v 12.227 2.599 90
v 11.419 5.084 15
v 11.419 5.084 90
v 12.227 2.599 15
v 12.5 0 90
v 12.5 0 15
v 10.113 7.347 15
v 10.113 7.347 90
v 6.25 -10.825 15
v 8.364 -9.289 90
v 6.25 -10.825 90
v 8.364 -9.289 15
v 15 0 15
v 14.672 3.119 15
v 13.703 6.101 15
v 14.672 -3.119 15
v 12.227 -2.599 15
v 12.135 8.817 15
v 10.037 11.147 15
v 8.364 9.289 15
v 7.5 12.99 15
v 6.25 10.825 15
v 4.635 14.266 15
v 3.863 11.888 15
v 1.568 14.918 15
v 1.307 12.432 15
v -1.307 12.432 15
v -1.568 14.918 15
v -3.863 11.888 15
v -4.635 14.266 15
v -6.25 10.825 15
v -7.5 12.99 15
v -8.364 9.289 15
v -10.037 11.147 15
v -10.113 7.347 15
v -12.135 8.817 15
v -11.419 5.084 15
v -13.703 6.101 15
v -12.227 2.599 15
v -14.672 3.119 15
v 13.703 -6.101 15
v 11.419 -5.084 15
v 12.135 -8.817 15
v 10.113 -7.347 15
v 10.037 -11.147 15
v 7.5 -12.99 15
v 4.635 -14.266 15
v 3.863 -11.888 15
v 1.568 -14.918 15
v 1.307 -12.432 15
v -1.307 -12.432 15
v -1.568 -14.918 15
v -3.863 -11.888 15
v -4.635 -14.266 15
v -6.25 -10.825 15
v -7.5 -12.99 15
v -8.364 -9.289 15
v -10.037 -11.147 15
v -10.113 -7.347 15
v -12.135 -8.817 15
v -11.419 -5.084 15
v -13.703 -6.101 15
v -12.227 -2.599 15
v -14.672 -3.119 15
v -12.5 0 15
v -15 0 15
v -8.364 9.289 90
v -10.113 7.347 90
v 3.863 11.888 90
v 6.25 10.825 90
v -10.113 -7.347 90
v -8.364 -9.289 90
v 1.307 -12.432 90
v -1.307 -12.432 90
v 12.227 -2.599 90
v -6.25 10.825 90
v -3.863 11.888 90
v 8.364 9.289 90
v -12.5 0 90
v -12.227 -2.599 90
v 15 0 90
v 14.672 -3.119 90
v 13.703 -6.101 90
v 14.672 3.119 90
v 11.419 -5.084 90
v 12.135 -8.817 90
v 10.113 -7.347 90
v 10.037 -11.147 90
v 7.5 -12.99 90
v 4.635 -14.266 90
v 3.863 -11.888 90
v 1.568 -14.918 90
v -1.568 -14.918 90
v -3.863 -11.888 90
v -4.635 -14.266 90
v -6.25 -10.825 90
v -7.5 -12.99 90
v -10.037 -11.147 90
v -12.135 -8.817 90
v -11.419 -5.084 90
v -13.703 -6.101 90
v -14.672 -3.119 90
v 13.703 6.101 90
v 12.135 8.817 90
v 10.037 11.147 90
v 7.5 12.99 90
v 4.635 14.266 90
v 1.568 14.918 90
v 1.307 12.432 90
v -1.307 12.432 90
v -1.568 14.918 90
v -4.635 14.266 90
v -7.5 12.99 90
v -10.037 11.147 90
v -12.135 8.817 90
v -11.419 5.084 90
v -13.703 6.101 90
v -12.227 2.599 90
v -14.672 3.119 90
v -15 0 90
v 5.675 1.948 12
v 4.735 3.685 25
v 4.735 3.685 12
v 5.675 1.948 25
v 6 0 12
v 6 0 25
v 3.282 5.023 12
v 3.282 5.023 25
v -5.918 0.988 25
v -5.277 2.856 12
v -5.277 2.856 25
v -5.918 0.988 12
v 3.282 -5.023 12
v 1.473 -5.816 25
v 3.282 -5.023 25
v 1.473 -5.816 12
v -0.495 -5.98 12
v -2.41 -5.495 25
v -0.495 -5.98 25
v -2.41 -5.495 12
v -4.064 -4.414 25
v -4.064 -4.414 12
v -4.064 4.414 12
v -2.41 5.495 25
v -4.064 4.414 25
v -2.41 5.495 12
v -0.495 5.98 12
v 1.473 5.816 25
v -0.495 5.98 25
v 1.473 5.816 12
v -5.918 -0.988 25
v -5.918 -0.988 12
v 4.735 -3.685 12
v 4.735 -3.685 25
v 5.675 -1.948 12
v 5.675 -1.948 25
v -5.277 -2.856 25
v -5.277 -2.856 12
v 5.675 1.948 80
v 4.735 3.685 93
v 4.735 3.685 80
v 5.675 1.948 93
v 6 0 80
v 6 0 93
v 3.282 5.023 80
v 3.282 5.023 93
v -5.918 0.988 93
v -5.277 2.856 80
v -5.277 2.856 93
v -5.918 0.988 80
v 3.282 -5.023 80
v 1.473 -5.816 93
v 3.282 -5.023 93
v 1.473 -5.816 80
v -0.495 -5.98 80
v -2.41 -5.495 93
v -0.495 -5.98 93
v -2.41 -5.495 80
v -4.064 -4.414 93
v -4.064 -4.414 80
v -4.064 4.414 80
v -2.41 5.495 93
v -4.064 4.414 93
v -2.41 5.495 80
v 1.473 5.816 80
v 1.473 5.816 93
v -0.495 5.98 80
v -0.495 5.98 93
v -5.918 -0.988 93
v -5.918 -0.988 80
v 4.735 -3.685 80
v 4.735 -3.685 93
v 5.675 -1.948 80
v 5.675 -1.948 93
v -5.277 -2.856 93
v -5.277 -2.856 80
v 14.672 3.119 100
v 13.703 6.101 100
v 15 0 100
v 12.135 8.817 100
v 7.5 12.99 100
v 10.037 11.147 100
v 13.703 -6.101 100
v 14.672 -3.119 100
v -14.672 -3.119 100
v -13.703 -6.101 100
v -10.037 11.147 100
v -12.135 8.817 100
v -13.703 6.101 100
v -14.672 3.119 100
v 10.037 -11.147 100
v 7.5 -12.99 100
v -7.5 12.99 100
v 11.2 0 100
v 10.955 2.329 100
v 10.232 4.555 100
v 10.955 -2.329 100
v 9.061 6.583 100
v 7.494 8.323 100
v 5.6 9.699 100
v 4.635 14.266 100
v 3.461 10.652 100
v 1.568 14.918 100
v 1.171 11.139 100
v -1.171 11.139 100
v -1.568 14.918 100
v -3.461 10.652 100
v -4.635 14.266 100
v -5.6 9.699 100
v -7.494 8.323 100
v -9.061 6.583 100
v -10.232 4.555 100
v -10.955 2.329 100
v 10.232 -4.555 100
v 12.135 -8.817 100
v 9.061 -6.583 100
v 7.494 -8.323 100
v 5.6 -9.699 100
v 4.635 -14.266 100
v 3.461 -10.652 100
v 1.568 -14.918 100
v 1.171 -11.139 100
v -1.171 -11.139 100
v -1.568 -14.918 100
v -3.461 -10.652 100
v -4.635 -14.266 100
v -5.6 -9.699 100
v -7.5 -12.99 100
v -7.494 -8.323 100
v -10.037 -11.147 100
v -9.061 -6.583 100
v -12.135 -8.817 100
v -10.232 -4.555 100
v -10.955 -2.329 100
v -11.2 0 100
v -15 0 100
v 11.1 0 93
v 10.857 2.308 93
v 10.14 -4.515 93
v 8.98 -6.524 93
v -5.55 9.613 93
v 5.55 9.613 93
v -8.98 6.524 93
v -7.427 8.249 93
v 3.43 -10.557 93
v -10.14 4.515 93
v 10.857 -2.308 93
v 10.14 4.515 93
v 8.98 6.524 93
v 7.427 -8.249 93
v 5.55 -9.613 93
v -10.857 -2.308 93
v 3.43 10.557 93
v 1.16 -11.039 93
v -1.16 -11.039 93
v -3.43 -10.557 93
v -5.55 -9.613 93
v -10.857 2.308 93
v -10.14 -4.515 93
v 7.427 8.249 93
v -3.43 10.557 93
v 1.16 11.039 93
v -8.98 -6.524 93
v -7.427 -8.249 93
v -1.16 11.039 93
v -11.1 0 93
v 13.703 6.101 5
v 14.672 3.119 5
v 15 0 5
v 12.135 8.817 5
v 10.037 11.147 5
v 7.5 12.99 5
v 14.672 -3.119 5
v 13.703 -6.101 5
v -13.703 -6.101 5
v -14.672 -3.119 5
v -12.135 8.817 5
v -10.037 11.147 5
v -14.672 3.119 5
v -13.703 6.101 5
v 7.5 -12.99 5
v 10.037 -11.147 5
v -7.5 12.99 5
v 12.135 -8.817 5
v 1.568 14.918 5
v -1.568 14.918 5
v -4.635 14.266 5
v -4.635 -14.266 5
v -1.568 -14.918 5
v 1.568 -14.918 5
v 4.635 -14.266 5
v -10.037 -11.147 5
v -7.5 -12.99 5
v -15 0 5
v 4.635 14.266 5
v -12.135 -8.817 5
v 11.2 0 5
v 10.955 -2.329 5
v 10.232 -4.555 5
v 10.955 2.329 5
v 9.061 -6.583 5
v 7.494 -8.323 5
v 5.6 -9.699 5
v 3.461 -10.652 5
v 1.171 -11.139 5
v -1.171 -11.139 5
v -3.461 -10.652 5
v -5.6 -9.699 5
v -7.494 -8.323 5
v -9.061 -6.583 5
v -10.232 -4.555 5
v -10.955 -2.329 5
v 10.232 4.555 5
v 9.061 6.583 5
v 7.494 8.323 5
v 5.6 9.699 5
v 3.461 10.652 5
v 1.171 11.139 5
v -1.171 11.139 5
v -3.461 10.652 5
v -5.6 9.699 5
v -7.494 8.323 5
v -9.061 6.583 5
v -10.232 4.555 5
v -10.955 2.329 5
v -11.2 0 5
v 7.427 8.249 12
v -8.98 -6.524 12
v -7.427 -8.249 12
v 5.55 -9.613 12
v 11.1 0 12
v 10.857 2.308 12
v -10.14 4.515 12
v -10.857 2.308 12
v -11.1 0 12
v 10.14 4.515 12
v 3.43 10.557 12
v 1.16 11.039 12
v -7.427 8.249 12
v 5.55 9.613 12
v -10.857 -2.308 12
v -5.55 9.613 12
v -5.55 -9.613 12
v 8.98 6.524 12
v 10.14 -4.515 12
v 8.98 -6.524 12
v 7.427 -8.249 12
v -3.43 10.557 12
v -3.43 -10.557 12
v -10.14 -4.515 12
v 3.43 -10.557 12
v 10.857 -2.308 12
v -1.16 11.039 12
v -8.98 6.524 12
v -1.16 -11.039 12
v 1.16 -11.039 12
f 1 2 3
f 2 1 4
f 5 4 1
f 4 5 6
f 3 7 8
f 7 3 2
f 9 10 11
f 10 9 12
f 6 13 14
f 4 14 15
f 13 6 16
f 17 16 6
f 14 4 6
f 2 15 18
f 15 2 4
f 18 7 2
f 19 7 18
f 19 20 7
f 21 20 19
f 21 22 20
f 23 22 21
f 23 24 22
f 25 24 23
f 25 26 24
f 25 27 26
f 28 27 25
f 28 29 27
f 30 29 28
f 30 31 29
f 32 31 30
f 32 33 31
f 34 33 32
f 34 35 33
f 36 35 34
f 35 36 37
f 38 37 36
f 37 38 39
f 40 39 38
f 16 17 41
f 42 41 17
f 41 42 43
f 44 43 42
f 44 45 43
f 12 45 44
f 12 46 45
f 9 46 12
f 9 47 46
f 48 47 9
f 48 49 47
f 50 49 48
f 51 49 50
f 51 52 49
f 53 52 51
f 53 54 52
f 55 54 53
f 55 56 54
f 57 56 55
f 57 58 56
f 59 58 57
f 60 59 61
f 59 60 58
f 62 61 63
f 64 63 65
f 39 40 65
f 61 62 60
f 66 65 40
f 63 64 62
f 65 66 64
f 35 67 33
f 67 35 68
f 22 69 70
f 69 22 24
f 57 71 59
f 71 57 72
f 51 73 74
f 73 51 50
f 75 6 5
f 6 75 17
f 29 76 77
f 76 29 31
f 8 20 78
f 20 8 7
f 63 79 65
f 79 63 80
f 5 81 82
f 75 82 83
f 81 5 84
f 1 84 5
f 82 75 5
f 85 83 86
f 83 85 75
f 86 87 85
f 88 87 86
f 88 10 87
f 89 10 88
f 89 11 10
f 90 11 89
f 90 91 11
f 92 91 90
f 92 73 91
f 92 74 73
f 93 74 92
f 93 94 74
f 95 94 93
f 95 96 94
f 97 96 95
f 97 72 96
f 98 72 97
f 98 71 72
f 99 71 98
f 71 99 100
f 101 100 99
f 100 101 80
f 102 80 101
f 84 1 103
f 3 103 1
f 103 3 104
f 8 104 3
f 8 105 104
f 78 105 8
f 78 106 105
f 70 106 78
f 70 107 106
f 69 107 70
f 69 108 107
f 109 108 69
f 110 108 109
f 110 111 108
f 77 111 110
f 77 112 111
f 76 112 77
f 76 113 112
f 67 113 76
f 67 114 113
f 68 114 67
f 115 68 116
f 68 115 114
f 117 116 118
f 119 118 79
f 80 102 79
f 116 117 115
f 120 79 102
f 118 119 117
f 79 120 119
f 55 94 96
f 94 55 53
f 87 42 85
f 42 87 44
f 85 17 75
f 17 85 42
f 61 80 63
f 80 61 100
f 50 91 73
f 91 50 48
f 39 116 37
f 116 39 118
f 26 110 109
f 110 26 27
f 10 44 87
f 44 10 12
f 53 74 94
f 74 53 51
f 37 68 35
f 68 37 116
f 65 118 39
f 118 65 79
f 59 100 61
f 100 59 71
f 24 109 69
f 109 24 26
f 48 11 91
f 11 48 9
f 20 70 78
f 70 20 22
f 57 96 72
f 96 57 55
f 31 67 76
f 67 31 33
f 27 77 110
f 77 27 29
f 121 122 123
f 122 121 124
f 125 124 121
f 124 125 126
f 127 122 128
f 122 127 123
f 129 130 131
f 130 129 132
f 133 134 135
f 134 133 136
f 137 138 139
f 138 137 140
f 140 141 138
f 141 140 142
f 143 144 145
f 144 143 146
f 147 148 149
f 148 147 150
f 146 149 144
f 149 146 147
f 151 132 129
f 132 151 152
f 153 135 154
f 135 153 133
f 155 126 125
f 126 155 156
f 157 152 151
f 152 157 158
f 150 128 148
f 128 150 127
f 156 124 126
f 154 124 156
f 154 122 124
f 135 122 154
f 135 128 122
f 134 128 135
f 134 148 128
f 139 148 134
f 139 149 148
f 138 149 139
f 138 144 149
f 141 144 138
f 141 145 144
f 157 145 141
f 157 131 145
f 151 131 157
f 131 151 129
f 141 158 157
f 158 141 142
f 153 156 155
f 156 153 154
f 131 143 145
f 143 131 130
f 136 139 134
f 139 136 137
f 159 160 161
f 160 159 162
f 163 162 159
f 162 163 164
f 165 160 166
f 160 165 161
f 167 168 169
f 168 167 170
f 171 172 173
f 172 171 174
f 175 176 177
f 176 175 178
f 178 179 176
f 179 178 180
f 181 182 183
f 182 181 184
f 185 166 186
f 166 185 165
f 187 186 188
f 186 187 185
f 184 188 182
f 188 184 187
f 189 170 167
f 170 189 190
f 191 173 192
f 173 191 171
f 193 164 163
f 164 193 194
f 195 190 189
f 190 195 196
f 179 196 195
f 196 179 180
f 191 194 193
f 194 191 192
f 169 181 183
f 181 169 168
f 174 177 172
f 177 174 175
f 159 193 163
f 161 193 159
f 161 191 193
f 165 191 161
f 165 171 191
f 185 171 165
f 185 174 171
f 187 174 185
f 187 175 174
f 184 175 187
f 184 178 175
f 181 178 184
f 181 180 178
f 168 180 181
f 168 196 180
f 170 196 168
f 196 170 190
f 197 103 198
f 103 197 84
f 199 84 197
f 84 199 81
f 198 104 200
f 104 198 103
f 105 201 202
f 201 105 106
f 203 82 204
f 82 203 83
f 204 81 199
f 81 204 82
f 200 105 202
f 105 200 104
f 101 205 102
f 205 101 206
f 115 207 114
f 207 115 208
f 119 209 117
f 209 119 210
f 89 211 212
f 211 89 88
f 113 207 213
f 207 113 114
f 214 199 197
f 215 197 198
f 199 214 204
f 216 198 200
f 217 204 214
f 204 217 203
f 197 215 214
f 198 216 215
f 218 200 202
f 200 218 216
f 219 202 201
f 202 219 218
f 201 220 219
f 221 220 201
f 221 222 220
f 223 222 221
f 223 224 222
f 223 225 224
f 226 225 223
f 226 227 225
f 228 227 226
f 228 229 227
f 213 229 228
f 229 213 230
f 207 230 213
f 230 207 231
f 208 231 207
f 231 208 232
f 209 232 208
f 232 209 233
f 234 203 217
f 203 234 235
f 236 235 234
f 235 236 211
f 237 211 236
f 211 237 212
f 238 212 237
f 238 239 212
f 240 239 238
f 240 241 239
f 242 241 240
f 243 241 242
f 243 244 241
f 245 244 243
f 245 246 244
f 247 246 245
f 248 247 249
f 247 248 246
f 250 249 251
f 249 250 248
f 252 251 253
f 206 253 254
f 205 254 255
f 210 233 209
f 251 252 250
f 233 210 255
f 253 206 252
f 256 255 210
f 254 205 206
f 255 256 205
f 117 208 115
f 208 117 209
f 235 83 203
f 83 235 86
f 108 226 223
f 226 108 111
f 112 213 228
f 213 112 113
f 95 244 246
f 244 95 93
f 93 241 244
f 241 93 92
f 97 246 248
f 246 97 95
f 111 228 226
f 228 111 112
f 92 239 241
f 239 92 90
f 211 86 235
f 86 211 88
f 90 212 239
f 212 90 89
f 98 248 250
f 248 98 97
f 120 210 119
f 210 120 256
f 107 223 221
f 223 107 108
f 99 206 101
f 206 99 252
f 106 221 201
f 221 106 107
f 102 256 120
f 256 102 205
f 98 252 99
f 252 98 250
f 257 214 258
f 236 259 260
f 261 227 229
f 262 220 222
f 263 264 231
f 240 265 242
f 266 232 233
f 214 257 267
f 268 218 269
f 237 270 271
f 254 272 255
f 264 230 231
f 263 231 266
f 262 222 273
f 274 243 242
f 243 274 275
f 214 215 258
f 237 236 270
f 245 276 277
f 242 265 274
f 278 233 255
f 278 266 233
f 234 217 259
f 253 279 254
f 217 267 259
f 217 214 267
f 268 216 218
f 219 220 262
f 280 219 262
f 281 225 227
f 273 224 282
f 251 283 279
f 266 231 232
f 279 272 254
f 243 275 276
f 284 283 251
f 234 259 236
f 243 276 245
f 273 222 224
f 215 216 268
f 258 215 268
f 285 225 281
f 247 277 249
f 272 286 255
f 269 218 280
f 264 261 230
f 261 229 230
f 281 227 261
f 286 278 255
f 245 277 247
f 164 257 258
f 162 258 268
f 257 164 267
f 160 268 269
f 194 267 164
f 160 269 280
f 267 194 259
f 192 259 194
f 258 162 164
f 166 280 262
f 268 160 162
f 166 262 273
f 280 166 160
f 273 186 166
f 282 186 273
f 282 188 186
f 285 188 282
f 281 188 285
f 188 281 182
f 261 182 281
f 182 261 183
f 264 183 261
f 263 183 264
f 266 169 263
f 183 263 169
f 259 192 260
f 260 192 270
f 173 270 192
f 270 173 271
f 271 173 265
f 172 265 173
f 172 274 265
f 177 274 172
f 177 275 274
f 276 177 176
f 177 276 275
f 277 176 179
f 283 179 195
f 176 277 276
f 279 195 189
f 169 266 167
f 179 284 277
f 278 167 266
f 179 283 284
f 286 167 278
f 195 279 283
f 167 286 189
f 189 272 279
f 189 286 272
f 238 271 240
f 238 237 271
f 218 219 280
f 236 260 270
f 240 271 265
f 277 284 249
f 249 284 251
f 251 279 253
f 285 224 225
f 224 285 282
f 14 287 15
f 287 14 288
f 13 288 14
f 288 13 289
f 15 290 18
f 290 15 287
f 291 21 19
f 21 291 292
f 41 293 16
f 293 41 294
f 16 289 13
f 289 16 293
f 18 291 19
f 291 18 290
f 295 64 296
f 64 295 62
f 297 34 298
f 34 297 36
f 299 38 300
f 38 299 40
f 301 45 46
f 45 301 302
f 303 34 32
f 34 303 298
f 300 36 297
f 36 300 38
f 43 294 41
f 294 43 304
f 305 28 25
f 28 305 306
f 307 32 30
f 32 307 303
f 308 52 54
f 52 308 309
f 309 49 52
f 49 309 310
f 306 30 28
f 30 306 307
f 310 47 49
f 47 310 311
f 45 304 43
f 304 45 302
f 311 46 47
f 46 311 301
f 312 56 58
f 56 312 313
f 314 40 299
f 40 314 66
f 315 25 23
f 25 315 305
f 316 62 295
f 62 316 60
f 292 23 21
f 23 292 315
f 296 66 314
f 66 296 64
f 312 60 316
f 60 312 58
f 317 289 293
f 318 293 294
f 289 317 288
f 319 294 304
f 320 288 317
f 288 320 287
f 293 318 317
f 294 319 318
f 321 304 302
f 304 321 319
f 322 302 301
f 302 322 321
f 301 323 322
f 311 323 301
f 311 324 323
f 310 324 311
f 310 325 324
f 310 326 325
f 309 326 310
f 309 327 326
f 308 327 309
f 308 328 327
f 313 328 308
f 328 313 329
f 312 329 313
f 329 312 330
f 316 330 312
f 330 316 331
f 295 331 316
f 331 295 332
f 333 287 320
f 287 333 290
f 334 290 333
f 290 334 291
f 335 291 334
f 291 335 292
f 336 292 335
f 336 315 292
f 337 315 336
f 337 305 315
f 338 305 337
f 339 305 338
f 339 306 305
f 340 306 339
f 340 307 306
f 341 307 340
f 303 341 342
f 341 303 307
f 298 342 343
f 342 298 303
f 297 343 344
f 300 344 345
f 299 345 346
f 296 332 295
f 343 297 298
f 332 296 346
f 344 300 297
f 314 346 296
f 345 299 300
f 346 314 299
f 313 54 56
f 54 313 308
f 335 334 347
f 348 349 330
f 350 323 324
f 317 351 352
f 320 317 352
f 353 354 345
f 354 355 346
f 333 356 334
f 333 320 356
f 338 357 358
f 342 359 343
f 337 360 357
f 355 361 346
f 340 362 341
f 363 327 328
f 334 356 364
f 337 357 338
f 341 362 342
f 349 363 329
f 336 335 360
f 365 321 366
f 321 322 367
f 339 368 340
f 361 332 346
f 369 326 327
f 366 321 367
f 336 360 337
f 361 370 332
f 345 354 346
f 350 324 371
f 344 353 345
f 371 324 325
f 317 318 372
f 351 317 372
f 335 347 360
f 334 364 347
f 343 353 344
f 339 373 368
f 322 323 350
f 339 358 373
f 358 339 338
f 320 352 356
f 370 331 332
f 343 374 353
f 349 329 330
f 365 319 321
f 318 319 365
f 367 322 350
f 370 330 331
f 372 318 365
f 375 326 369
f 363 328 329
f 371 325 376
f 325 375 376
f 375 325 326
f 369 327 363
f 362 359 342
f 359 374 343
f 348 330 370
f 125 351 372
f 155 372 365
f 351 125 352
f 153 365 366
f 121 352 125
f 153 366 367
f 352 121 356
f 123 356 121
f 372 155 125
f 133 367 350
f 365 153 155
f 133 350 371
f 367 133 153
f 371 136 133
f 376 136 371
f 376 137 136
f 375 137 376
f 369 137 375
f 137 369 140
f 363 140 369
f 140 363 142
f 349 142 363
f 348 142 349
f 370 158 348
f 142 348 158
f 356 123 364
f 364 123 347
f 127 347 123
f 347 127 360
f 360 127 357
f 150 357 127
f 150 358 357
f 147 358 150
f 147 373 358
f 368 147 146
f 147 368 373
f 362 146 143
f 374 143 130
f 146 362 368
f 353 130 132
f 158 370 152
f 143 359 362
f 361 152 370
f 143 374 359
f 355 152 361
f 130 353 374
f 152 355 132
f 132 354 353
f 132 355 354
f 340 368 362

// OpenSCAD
roller_width = 75;
offset = 0.1;
bearing_size = 22;
bearing_inner_size = 8;
/*
translate([0,0,5])
cylinder(h=10, d1=bearing_inner_size, d2=bearing_inner_size-offset);

difference(){
hull(){
cylinder(h=5, d=bearing_inner_size);


translate([20,0,5/2])
cube([7,20*2+3+5*2,5], true);
}

translate([21,0,5/2])
cube([5,3,5], true);

translate([21,20,5/2])
cube([5,3,5], true);

translate([21,-20,5/2])
cube([5,3,5], true);
}
*/

translate([0,0,15])
roller();

module roller(){
 difference(){
    cylinder(h=roller_width, d=25);
    #cylinder(h=10, d=12);
    #translate([0,0,roller_width-10])
     cylinder(h=10, d=12);
 }
translate([0,0,roller_width])
difference(){
    cylinder(h=10, d=25+5);
    translate([0,0,3])
    cylinder(h=7, d1=bearing_size+offset*2, d2=bearing_size+offset*4);
    cylinder(h=15, d=12);
}

translate([0,0,-10])
difference(){
    cylinder(h=10, d=25+5);
    cylinder(h=7, d1=bearing_size+offset*4, d2=bearing_size+offset*2);
    cylinder(h=15, d=12);
}
}
